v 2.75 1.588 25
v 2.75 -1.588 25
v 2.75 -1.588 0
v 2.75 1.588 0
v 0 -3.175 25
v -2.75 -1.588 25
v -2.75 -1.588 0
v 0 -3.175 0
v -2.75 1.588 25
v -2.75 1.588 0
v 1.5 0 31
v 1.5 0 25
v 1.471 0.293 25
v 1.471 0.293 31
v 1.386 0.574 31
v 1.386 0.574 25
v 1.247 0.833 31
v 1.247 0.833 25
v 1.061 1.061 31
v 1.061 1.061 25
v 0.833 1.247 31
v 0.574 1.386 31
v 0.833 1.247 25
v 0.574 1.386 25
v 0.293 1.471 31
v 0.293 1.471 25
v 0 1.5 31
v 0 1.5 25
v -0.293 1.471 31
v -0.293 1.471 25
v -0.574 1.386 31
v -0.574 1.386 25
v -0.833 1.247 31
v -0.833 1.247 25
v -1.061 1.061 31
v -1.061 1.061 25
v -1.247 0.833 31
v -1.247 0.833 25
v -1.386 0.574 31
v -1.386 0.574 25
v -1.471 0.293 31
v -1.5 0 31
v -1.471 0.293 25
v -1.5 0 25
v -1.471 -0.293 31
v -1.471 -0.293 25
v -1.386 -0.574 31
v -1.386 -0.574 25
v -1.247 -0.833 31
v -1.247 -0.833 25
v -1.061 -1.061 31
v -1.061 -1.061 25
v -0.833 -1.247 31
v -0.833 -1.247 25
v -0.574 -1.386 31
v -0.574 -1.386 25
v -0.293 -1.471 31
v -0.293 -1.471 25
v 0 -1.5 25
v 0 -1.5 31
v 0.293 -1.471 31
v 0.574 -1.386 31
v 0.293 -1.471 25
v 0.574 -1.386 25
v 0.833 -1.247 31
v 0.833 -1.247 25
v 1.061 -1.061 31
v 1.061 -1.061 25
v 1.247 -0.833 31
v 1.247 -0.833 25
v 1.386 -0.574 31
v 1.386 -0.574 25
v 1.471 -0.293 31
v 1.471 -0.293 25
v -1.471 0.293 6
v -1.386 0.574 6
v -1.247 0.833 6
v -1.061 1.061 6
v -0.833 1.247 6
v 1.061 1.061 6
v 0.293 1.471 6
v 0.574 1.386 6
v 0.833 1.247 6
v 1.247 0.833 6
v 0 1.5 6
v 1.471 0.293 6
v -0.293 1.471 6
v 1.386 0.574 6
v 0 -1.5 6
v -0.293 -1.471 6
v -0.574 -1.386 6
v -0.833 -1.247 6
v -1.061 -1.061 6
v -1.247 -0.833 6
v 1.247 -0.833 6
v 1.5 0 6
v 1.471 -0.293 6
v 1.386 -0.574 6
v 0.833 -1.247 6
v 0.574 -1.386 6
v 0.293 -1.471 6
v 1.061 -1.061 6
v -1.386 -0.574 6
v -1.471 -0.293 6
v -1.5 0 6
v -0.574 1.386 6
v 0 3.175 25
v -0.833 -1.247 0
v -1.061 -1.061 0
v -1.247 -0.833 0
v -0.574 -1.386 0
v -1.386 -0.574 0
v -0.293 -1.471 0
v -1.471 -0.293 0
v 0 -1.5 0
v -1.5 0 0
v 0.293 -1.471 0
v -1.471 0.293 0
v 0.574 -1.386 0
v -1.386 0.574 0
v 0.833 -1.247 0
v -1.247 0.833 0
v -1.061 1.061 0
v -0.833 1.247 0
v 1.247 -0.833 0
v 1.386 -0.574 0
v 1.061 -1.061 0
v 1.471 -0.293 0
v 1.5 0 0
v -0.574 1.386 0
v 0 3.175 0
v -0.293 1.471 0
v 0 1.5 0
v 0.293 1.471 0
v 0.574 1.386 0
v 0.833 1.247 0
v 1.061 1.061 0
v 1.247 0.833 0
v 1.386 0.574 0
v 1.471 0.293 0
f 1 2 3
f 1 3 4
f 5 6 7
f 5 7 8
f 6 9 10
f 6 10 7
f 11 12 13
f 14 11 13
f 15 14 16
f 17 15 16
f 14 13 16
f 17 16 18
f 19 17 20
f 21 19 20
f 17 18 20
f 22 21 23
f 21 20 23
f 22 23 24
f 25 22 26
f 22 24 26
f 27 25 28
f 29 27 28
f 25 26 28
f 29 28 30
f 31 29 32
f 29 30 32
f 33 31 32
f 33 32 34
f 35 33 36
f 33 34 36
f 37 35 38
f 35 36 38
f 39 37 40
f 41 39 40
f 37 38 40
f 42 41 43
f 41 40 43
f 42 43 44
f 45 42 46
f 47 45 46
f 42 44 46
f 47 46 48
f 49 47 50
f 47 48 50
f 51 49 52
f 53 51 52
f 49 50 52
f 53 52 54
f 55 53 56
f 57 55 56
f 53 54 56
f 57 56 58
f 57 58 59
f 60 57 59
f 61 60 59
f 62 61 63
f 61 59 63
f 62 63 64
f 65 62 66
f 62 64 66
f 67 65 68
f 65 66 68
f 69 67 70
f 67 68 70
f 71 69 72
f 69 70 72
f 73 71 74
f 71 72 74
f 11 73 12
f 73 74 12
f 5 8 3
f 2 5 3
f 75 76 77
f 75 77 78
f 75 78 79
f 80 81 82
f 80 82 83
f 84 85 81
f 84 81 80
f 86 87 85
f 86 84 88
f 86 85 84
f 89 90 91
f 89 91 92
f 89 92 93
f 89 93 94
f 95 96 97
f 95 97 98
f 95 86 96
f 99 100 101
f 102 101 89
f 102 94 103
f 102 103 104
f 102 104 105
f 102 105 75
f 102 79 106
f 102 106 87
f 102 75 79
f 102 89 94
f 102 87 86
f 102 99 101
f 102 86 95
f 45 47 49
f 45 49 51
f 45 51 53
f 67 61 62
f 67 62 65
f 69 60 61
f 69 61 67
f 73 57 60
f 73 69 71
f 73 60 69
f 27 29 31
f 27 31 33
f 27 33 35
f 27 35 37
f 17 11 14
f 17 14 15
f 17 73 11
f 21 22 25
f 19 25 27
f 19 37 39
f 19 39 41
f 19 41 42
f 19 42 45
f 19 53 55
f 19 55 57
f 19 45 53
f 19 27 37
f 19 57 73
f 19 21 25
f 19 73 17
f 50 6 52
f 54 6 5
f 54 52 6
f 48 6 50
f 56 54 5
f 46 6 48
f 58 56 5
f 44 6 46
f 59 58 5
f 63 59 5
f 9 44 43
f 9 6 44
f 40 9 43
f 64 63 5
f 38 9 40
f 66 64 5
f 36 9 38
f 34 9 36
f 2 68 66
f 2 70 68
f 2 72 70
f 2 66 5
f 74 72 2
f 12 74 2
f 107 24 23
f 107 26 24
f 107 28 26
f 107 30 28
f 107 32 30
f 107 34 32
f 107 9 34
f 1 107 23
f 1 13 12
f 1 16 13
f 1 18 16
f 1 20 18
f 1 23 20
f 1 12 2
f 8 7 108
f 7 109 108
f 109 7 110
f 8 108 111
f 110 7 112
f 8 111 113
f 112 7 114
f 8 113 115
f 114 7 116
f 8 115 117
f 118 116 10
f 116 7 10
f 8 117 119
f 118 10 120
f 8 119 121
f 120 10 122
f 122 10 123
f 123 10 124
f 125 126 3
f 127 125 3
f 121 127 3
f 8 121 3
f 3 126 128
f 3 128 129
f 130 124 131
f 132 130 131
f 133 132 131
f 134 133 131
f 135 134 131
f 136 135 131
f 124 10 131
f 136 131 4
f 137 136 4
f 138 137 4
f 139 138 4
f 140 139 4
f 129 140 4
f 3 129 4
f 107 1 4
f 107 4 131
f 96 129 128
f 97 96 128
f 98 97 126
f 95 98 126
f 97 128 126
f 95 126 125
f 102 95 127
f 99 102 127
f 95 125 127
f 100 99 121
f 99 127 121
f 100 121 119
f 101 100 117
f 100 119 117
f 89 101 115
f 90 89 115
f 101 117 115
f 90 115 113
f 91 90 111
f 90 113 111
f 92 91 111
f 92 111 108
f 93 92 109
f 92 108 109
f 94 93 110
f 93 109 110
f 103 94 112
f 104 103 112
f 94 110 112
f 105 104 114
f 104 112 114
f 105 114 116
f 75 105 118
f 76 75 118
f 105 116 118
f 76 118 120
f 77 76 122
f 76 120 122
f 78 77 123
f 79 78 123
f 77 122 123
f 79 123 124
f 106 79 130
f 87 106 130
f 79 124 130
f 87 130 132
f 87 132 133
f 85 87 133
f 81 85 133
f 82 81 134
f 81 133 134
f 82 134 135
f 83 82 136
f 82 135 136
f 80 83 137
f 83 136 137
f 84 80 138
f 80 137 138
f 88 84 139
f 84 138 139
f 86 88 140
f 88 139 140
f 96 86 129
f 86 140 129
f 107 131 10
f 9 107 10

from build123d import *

# Parameters (mm, degrees)
F1_DEPTH = 25
F2_R     = 1.5
F3_DEPTH = 6
F4_R     = 1.5
F5_DEPTH = 6


with BuildPart() as f1:
    # F0 (on Top) → F1 (new body)
    with BuildSketch(Plane.XY):
        Polygon((0, 3.1754264805), (-2.75, 1.5877132403), (-2.75, -1.5877132403), (0, -3.1754264805), (2.75, -1.5877132403), (2.75, 1.5877132403), align=None)
    extrude(amount=F1_DEPTH)

    # F2 (on face) → F3 (join)
    with BuildSketch(Plane.XY.offset(25)):
        Circle(F2_R)
    extrude(amount=F3_DEPTH)

    # F4 (on face) → F5 (cut)
    with BuildSketch(Plane(origin=(0, 0, 0), x_dir=(1, 0, 0), z_dir=(0, 0, -1))):
        Circle(F4_R)
    extrude(amount=-F5_DEPTH, mode=Mode.SUBTRACT)


solid = f1.part
